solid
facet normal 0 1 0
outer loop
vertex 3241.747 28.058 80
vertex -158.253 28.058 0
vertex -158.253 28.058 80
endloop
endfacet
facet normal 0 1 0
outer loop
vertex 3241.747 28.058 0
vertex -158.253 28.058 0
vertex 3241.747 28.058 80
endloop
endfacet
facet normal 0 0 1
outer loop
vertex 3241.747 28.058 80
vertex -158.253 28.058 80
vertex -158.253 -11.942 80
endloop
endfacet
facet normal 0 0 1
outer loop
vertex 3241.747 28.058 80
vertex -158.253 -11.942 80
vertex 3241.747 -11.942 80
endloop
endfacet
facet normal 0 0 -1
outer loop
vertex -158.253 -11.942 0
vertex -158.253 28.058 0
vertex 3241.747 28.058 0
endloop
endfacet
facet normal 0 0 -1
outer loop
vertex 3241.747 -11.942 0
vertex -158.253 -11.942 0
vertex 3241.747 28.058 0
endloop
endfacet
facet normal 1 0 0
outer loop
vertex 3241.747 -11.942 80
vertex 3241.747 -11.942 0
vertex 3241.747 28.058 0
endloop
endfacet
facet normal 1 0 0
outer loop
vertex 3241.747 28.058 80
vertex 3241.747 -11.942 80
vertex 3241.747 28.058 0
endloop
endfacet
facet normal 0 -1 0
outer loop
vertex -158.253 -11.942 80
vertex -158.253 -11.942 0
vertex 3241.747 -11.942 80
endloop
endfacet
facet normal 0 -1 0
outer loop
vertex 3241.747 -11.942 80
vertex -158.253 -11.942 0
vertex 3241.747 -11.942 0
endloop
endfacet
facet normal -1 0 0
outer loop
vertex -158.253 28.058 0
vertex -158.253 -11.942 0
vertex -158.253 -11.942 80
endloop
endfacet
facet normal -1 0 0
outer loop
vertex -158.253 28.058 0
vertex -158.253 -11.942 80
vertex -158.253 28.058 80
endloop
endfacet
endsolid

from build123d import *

# Parameters (mm, degrees)
CROQUIS1_W              = 3400
CROQUIS1_H              = 40
SALIENTE_EXTRUIR1_DEPTH = 80
CROQUIS2_W              = 70.726899914
CROQUIS2_H              = 30.836055435
SALIENTE_EXTRUIR2_DEPTH = 3400
CROQUIS3_W              = 62.144796725
CROQUIS3_H              = 26.738647853
SALIENTE_EXTRUIR4_DEPTH = 3400


with BuildPart() as part:
    # Croquis1 → Saliente-Extruir1 (new body)
    with BuildSketch(Plane.XY):
        with Locations((1541.746970888, 8.058487021)):
            Rectangle(CROQUIS1_W, CROQUIS1_H)
    extrude(amount=SALIENTE_EXTRUIR1_DEPTH)

    # Croquis2 → Saliente-Extruir2 (add)
    with BuildSketch(Plane.ZY.offset(158.253029112)):
        with Locations((41.19205332, 7.663036553)):
            Rectangle(CROQUIS2_W, CROQUIS2_H)
    extrude(amount=-SALIENTE_EXTRUIR2_DEPTH)

    # Croquis3 → Saliente-Extruir4 (add)
    with BuildSketch(Plane(origin=(3241.746970888, 0, 0), x_dir=(0, 0, -1), z_dir=(1, 0, 0))):
        with Locations((-38.975461985, 6.544049844)):
            Rectangle(CROQUIS3_W, CROQUIS3_H)
    extrude(amount=-SALIENTE_EXTRUIR4_DEPTH)


solid = part.part
